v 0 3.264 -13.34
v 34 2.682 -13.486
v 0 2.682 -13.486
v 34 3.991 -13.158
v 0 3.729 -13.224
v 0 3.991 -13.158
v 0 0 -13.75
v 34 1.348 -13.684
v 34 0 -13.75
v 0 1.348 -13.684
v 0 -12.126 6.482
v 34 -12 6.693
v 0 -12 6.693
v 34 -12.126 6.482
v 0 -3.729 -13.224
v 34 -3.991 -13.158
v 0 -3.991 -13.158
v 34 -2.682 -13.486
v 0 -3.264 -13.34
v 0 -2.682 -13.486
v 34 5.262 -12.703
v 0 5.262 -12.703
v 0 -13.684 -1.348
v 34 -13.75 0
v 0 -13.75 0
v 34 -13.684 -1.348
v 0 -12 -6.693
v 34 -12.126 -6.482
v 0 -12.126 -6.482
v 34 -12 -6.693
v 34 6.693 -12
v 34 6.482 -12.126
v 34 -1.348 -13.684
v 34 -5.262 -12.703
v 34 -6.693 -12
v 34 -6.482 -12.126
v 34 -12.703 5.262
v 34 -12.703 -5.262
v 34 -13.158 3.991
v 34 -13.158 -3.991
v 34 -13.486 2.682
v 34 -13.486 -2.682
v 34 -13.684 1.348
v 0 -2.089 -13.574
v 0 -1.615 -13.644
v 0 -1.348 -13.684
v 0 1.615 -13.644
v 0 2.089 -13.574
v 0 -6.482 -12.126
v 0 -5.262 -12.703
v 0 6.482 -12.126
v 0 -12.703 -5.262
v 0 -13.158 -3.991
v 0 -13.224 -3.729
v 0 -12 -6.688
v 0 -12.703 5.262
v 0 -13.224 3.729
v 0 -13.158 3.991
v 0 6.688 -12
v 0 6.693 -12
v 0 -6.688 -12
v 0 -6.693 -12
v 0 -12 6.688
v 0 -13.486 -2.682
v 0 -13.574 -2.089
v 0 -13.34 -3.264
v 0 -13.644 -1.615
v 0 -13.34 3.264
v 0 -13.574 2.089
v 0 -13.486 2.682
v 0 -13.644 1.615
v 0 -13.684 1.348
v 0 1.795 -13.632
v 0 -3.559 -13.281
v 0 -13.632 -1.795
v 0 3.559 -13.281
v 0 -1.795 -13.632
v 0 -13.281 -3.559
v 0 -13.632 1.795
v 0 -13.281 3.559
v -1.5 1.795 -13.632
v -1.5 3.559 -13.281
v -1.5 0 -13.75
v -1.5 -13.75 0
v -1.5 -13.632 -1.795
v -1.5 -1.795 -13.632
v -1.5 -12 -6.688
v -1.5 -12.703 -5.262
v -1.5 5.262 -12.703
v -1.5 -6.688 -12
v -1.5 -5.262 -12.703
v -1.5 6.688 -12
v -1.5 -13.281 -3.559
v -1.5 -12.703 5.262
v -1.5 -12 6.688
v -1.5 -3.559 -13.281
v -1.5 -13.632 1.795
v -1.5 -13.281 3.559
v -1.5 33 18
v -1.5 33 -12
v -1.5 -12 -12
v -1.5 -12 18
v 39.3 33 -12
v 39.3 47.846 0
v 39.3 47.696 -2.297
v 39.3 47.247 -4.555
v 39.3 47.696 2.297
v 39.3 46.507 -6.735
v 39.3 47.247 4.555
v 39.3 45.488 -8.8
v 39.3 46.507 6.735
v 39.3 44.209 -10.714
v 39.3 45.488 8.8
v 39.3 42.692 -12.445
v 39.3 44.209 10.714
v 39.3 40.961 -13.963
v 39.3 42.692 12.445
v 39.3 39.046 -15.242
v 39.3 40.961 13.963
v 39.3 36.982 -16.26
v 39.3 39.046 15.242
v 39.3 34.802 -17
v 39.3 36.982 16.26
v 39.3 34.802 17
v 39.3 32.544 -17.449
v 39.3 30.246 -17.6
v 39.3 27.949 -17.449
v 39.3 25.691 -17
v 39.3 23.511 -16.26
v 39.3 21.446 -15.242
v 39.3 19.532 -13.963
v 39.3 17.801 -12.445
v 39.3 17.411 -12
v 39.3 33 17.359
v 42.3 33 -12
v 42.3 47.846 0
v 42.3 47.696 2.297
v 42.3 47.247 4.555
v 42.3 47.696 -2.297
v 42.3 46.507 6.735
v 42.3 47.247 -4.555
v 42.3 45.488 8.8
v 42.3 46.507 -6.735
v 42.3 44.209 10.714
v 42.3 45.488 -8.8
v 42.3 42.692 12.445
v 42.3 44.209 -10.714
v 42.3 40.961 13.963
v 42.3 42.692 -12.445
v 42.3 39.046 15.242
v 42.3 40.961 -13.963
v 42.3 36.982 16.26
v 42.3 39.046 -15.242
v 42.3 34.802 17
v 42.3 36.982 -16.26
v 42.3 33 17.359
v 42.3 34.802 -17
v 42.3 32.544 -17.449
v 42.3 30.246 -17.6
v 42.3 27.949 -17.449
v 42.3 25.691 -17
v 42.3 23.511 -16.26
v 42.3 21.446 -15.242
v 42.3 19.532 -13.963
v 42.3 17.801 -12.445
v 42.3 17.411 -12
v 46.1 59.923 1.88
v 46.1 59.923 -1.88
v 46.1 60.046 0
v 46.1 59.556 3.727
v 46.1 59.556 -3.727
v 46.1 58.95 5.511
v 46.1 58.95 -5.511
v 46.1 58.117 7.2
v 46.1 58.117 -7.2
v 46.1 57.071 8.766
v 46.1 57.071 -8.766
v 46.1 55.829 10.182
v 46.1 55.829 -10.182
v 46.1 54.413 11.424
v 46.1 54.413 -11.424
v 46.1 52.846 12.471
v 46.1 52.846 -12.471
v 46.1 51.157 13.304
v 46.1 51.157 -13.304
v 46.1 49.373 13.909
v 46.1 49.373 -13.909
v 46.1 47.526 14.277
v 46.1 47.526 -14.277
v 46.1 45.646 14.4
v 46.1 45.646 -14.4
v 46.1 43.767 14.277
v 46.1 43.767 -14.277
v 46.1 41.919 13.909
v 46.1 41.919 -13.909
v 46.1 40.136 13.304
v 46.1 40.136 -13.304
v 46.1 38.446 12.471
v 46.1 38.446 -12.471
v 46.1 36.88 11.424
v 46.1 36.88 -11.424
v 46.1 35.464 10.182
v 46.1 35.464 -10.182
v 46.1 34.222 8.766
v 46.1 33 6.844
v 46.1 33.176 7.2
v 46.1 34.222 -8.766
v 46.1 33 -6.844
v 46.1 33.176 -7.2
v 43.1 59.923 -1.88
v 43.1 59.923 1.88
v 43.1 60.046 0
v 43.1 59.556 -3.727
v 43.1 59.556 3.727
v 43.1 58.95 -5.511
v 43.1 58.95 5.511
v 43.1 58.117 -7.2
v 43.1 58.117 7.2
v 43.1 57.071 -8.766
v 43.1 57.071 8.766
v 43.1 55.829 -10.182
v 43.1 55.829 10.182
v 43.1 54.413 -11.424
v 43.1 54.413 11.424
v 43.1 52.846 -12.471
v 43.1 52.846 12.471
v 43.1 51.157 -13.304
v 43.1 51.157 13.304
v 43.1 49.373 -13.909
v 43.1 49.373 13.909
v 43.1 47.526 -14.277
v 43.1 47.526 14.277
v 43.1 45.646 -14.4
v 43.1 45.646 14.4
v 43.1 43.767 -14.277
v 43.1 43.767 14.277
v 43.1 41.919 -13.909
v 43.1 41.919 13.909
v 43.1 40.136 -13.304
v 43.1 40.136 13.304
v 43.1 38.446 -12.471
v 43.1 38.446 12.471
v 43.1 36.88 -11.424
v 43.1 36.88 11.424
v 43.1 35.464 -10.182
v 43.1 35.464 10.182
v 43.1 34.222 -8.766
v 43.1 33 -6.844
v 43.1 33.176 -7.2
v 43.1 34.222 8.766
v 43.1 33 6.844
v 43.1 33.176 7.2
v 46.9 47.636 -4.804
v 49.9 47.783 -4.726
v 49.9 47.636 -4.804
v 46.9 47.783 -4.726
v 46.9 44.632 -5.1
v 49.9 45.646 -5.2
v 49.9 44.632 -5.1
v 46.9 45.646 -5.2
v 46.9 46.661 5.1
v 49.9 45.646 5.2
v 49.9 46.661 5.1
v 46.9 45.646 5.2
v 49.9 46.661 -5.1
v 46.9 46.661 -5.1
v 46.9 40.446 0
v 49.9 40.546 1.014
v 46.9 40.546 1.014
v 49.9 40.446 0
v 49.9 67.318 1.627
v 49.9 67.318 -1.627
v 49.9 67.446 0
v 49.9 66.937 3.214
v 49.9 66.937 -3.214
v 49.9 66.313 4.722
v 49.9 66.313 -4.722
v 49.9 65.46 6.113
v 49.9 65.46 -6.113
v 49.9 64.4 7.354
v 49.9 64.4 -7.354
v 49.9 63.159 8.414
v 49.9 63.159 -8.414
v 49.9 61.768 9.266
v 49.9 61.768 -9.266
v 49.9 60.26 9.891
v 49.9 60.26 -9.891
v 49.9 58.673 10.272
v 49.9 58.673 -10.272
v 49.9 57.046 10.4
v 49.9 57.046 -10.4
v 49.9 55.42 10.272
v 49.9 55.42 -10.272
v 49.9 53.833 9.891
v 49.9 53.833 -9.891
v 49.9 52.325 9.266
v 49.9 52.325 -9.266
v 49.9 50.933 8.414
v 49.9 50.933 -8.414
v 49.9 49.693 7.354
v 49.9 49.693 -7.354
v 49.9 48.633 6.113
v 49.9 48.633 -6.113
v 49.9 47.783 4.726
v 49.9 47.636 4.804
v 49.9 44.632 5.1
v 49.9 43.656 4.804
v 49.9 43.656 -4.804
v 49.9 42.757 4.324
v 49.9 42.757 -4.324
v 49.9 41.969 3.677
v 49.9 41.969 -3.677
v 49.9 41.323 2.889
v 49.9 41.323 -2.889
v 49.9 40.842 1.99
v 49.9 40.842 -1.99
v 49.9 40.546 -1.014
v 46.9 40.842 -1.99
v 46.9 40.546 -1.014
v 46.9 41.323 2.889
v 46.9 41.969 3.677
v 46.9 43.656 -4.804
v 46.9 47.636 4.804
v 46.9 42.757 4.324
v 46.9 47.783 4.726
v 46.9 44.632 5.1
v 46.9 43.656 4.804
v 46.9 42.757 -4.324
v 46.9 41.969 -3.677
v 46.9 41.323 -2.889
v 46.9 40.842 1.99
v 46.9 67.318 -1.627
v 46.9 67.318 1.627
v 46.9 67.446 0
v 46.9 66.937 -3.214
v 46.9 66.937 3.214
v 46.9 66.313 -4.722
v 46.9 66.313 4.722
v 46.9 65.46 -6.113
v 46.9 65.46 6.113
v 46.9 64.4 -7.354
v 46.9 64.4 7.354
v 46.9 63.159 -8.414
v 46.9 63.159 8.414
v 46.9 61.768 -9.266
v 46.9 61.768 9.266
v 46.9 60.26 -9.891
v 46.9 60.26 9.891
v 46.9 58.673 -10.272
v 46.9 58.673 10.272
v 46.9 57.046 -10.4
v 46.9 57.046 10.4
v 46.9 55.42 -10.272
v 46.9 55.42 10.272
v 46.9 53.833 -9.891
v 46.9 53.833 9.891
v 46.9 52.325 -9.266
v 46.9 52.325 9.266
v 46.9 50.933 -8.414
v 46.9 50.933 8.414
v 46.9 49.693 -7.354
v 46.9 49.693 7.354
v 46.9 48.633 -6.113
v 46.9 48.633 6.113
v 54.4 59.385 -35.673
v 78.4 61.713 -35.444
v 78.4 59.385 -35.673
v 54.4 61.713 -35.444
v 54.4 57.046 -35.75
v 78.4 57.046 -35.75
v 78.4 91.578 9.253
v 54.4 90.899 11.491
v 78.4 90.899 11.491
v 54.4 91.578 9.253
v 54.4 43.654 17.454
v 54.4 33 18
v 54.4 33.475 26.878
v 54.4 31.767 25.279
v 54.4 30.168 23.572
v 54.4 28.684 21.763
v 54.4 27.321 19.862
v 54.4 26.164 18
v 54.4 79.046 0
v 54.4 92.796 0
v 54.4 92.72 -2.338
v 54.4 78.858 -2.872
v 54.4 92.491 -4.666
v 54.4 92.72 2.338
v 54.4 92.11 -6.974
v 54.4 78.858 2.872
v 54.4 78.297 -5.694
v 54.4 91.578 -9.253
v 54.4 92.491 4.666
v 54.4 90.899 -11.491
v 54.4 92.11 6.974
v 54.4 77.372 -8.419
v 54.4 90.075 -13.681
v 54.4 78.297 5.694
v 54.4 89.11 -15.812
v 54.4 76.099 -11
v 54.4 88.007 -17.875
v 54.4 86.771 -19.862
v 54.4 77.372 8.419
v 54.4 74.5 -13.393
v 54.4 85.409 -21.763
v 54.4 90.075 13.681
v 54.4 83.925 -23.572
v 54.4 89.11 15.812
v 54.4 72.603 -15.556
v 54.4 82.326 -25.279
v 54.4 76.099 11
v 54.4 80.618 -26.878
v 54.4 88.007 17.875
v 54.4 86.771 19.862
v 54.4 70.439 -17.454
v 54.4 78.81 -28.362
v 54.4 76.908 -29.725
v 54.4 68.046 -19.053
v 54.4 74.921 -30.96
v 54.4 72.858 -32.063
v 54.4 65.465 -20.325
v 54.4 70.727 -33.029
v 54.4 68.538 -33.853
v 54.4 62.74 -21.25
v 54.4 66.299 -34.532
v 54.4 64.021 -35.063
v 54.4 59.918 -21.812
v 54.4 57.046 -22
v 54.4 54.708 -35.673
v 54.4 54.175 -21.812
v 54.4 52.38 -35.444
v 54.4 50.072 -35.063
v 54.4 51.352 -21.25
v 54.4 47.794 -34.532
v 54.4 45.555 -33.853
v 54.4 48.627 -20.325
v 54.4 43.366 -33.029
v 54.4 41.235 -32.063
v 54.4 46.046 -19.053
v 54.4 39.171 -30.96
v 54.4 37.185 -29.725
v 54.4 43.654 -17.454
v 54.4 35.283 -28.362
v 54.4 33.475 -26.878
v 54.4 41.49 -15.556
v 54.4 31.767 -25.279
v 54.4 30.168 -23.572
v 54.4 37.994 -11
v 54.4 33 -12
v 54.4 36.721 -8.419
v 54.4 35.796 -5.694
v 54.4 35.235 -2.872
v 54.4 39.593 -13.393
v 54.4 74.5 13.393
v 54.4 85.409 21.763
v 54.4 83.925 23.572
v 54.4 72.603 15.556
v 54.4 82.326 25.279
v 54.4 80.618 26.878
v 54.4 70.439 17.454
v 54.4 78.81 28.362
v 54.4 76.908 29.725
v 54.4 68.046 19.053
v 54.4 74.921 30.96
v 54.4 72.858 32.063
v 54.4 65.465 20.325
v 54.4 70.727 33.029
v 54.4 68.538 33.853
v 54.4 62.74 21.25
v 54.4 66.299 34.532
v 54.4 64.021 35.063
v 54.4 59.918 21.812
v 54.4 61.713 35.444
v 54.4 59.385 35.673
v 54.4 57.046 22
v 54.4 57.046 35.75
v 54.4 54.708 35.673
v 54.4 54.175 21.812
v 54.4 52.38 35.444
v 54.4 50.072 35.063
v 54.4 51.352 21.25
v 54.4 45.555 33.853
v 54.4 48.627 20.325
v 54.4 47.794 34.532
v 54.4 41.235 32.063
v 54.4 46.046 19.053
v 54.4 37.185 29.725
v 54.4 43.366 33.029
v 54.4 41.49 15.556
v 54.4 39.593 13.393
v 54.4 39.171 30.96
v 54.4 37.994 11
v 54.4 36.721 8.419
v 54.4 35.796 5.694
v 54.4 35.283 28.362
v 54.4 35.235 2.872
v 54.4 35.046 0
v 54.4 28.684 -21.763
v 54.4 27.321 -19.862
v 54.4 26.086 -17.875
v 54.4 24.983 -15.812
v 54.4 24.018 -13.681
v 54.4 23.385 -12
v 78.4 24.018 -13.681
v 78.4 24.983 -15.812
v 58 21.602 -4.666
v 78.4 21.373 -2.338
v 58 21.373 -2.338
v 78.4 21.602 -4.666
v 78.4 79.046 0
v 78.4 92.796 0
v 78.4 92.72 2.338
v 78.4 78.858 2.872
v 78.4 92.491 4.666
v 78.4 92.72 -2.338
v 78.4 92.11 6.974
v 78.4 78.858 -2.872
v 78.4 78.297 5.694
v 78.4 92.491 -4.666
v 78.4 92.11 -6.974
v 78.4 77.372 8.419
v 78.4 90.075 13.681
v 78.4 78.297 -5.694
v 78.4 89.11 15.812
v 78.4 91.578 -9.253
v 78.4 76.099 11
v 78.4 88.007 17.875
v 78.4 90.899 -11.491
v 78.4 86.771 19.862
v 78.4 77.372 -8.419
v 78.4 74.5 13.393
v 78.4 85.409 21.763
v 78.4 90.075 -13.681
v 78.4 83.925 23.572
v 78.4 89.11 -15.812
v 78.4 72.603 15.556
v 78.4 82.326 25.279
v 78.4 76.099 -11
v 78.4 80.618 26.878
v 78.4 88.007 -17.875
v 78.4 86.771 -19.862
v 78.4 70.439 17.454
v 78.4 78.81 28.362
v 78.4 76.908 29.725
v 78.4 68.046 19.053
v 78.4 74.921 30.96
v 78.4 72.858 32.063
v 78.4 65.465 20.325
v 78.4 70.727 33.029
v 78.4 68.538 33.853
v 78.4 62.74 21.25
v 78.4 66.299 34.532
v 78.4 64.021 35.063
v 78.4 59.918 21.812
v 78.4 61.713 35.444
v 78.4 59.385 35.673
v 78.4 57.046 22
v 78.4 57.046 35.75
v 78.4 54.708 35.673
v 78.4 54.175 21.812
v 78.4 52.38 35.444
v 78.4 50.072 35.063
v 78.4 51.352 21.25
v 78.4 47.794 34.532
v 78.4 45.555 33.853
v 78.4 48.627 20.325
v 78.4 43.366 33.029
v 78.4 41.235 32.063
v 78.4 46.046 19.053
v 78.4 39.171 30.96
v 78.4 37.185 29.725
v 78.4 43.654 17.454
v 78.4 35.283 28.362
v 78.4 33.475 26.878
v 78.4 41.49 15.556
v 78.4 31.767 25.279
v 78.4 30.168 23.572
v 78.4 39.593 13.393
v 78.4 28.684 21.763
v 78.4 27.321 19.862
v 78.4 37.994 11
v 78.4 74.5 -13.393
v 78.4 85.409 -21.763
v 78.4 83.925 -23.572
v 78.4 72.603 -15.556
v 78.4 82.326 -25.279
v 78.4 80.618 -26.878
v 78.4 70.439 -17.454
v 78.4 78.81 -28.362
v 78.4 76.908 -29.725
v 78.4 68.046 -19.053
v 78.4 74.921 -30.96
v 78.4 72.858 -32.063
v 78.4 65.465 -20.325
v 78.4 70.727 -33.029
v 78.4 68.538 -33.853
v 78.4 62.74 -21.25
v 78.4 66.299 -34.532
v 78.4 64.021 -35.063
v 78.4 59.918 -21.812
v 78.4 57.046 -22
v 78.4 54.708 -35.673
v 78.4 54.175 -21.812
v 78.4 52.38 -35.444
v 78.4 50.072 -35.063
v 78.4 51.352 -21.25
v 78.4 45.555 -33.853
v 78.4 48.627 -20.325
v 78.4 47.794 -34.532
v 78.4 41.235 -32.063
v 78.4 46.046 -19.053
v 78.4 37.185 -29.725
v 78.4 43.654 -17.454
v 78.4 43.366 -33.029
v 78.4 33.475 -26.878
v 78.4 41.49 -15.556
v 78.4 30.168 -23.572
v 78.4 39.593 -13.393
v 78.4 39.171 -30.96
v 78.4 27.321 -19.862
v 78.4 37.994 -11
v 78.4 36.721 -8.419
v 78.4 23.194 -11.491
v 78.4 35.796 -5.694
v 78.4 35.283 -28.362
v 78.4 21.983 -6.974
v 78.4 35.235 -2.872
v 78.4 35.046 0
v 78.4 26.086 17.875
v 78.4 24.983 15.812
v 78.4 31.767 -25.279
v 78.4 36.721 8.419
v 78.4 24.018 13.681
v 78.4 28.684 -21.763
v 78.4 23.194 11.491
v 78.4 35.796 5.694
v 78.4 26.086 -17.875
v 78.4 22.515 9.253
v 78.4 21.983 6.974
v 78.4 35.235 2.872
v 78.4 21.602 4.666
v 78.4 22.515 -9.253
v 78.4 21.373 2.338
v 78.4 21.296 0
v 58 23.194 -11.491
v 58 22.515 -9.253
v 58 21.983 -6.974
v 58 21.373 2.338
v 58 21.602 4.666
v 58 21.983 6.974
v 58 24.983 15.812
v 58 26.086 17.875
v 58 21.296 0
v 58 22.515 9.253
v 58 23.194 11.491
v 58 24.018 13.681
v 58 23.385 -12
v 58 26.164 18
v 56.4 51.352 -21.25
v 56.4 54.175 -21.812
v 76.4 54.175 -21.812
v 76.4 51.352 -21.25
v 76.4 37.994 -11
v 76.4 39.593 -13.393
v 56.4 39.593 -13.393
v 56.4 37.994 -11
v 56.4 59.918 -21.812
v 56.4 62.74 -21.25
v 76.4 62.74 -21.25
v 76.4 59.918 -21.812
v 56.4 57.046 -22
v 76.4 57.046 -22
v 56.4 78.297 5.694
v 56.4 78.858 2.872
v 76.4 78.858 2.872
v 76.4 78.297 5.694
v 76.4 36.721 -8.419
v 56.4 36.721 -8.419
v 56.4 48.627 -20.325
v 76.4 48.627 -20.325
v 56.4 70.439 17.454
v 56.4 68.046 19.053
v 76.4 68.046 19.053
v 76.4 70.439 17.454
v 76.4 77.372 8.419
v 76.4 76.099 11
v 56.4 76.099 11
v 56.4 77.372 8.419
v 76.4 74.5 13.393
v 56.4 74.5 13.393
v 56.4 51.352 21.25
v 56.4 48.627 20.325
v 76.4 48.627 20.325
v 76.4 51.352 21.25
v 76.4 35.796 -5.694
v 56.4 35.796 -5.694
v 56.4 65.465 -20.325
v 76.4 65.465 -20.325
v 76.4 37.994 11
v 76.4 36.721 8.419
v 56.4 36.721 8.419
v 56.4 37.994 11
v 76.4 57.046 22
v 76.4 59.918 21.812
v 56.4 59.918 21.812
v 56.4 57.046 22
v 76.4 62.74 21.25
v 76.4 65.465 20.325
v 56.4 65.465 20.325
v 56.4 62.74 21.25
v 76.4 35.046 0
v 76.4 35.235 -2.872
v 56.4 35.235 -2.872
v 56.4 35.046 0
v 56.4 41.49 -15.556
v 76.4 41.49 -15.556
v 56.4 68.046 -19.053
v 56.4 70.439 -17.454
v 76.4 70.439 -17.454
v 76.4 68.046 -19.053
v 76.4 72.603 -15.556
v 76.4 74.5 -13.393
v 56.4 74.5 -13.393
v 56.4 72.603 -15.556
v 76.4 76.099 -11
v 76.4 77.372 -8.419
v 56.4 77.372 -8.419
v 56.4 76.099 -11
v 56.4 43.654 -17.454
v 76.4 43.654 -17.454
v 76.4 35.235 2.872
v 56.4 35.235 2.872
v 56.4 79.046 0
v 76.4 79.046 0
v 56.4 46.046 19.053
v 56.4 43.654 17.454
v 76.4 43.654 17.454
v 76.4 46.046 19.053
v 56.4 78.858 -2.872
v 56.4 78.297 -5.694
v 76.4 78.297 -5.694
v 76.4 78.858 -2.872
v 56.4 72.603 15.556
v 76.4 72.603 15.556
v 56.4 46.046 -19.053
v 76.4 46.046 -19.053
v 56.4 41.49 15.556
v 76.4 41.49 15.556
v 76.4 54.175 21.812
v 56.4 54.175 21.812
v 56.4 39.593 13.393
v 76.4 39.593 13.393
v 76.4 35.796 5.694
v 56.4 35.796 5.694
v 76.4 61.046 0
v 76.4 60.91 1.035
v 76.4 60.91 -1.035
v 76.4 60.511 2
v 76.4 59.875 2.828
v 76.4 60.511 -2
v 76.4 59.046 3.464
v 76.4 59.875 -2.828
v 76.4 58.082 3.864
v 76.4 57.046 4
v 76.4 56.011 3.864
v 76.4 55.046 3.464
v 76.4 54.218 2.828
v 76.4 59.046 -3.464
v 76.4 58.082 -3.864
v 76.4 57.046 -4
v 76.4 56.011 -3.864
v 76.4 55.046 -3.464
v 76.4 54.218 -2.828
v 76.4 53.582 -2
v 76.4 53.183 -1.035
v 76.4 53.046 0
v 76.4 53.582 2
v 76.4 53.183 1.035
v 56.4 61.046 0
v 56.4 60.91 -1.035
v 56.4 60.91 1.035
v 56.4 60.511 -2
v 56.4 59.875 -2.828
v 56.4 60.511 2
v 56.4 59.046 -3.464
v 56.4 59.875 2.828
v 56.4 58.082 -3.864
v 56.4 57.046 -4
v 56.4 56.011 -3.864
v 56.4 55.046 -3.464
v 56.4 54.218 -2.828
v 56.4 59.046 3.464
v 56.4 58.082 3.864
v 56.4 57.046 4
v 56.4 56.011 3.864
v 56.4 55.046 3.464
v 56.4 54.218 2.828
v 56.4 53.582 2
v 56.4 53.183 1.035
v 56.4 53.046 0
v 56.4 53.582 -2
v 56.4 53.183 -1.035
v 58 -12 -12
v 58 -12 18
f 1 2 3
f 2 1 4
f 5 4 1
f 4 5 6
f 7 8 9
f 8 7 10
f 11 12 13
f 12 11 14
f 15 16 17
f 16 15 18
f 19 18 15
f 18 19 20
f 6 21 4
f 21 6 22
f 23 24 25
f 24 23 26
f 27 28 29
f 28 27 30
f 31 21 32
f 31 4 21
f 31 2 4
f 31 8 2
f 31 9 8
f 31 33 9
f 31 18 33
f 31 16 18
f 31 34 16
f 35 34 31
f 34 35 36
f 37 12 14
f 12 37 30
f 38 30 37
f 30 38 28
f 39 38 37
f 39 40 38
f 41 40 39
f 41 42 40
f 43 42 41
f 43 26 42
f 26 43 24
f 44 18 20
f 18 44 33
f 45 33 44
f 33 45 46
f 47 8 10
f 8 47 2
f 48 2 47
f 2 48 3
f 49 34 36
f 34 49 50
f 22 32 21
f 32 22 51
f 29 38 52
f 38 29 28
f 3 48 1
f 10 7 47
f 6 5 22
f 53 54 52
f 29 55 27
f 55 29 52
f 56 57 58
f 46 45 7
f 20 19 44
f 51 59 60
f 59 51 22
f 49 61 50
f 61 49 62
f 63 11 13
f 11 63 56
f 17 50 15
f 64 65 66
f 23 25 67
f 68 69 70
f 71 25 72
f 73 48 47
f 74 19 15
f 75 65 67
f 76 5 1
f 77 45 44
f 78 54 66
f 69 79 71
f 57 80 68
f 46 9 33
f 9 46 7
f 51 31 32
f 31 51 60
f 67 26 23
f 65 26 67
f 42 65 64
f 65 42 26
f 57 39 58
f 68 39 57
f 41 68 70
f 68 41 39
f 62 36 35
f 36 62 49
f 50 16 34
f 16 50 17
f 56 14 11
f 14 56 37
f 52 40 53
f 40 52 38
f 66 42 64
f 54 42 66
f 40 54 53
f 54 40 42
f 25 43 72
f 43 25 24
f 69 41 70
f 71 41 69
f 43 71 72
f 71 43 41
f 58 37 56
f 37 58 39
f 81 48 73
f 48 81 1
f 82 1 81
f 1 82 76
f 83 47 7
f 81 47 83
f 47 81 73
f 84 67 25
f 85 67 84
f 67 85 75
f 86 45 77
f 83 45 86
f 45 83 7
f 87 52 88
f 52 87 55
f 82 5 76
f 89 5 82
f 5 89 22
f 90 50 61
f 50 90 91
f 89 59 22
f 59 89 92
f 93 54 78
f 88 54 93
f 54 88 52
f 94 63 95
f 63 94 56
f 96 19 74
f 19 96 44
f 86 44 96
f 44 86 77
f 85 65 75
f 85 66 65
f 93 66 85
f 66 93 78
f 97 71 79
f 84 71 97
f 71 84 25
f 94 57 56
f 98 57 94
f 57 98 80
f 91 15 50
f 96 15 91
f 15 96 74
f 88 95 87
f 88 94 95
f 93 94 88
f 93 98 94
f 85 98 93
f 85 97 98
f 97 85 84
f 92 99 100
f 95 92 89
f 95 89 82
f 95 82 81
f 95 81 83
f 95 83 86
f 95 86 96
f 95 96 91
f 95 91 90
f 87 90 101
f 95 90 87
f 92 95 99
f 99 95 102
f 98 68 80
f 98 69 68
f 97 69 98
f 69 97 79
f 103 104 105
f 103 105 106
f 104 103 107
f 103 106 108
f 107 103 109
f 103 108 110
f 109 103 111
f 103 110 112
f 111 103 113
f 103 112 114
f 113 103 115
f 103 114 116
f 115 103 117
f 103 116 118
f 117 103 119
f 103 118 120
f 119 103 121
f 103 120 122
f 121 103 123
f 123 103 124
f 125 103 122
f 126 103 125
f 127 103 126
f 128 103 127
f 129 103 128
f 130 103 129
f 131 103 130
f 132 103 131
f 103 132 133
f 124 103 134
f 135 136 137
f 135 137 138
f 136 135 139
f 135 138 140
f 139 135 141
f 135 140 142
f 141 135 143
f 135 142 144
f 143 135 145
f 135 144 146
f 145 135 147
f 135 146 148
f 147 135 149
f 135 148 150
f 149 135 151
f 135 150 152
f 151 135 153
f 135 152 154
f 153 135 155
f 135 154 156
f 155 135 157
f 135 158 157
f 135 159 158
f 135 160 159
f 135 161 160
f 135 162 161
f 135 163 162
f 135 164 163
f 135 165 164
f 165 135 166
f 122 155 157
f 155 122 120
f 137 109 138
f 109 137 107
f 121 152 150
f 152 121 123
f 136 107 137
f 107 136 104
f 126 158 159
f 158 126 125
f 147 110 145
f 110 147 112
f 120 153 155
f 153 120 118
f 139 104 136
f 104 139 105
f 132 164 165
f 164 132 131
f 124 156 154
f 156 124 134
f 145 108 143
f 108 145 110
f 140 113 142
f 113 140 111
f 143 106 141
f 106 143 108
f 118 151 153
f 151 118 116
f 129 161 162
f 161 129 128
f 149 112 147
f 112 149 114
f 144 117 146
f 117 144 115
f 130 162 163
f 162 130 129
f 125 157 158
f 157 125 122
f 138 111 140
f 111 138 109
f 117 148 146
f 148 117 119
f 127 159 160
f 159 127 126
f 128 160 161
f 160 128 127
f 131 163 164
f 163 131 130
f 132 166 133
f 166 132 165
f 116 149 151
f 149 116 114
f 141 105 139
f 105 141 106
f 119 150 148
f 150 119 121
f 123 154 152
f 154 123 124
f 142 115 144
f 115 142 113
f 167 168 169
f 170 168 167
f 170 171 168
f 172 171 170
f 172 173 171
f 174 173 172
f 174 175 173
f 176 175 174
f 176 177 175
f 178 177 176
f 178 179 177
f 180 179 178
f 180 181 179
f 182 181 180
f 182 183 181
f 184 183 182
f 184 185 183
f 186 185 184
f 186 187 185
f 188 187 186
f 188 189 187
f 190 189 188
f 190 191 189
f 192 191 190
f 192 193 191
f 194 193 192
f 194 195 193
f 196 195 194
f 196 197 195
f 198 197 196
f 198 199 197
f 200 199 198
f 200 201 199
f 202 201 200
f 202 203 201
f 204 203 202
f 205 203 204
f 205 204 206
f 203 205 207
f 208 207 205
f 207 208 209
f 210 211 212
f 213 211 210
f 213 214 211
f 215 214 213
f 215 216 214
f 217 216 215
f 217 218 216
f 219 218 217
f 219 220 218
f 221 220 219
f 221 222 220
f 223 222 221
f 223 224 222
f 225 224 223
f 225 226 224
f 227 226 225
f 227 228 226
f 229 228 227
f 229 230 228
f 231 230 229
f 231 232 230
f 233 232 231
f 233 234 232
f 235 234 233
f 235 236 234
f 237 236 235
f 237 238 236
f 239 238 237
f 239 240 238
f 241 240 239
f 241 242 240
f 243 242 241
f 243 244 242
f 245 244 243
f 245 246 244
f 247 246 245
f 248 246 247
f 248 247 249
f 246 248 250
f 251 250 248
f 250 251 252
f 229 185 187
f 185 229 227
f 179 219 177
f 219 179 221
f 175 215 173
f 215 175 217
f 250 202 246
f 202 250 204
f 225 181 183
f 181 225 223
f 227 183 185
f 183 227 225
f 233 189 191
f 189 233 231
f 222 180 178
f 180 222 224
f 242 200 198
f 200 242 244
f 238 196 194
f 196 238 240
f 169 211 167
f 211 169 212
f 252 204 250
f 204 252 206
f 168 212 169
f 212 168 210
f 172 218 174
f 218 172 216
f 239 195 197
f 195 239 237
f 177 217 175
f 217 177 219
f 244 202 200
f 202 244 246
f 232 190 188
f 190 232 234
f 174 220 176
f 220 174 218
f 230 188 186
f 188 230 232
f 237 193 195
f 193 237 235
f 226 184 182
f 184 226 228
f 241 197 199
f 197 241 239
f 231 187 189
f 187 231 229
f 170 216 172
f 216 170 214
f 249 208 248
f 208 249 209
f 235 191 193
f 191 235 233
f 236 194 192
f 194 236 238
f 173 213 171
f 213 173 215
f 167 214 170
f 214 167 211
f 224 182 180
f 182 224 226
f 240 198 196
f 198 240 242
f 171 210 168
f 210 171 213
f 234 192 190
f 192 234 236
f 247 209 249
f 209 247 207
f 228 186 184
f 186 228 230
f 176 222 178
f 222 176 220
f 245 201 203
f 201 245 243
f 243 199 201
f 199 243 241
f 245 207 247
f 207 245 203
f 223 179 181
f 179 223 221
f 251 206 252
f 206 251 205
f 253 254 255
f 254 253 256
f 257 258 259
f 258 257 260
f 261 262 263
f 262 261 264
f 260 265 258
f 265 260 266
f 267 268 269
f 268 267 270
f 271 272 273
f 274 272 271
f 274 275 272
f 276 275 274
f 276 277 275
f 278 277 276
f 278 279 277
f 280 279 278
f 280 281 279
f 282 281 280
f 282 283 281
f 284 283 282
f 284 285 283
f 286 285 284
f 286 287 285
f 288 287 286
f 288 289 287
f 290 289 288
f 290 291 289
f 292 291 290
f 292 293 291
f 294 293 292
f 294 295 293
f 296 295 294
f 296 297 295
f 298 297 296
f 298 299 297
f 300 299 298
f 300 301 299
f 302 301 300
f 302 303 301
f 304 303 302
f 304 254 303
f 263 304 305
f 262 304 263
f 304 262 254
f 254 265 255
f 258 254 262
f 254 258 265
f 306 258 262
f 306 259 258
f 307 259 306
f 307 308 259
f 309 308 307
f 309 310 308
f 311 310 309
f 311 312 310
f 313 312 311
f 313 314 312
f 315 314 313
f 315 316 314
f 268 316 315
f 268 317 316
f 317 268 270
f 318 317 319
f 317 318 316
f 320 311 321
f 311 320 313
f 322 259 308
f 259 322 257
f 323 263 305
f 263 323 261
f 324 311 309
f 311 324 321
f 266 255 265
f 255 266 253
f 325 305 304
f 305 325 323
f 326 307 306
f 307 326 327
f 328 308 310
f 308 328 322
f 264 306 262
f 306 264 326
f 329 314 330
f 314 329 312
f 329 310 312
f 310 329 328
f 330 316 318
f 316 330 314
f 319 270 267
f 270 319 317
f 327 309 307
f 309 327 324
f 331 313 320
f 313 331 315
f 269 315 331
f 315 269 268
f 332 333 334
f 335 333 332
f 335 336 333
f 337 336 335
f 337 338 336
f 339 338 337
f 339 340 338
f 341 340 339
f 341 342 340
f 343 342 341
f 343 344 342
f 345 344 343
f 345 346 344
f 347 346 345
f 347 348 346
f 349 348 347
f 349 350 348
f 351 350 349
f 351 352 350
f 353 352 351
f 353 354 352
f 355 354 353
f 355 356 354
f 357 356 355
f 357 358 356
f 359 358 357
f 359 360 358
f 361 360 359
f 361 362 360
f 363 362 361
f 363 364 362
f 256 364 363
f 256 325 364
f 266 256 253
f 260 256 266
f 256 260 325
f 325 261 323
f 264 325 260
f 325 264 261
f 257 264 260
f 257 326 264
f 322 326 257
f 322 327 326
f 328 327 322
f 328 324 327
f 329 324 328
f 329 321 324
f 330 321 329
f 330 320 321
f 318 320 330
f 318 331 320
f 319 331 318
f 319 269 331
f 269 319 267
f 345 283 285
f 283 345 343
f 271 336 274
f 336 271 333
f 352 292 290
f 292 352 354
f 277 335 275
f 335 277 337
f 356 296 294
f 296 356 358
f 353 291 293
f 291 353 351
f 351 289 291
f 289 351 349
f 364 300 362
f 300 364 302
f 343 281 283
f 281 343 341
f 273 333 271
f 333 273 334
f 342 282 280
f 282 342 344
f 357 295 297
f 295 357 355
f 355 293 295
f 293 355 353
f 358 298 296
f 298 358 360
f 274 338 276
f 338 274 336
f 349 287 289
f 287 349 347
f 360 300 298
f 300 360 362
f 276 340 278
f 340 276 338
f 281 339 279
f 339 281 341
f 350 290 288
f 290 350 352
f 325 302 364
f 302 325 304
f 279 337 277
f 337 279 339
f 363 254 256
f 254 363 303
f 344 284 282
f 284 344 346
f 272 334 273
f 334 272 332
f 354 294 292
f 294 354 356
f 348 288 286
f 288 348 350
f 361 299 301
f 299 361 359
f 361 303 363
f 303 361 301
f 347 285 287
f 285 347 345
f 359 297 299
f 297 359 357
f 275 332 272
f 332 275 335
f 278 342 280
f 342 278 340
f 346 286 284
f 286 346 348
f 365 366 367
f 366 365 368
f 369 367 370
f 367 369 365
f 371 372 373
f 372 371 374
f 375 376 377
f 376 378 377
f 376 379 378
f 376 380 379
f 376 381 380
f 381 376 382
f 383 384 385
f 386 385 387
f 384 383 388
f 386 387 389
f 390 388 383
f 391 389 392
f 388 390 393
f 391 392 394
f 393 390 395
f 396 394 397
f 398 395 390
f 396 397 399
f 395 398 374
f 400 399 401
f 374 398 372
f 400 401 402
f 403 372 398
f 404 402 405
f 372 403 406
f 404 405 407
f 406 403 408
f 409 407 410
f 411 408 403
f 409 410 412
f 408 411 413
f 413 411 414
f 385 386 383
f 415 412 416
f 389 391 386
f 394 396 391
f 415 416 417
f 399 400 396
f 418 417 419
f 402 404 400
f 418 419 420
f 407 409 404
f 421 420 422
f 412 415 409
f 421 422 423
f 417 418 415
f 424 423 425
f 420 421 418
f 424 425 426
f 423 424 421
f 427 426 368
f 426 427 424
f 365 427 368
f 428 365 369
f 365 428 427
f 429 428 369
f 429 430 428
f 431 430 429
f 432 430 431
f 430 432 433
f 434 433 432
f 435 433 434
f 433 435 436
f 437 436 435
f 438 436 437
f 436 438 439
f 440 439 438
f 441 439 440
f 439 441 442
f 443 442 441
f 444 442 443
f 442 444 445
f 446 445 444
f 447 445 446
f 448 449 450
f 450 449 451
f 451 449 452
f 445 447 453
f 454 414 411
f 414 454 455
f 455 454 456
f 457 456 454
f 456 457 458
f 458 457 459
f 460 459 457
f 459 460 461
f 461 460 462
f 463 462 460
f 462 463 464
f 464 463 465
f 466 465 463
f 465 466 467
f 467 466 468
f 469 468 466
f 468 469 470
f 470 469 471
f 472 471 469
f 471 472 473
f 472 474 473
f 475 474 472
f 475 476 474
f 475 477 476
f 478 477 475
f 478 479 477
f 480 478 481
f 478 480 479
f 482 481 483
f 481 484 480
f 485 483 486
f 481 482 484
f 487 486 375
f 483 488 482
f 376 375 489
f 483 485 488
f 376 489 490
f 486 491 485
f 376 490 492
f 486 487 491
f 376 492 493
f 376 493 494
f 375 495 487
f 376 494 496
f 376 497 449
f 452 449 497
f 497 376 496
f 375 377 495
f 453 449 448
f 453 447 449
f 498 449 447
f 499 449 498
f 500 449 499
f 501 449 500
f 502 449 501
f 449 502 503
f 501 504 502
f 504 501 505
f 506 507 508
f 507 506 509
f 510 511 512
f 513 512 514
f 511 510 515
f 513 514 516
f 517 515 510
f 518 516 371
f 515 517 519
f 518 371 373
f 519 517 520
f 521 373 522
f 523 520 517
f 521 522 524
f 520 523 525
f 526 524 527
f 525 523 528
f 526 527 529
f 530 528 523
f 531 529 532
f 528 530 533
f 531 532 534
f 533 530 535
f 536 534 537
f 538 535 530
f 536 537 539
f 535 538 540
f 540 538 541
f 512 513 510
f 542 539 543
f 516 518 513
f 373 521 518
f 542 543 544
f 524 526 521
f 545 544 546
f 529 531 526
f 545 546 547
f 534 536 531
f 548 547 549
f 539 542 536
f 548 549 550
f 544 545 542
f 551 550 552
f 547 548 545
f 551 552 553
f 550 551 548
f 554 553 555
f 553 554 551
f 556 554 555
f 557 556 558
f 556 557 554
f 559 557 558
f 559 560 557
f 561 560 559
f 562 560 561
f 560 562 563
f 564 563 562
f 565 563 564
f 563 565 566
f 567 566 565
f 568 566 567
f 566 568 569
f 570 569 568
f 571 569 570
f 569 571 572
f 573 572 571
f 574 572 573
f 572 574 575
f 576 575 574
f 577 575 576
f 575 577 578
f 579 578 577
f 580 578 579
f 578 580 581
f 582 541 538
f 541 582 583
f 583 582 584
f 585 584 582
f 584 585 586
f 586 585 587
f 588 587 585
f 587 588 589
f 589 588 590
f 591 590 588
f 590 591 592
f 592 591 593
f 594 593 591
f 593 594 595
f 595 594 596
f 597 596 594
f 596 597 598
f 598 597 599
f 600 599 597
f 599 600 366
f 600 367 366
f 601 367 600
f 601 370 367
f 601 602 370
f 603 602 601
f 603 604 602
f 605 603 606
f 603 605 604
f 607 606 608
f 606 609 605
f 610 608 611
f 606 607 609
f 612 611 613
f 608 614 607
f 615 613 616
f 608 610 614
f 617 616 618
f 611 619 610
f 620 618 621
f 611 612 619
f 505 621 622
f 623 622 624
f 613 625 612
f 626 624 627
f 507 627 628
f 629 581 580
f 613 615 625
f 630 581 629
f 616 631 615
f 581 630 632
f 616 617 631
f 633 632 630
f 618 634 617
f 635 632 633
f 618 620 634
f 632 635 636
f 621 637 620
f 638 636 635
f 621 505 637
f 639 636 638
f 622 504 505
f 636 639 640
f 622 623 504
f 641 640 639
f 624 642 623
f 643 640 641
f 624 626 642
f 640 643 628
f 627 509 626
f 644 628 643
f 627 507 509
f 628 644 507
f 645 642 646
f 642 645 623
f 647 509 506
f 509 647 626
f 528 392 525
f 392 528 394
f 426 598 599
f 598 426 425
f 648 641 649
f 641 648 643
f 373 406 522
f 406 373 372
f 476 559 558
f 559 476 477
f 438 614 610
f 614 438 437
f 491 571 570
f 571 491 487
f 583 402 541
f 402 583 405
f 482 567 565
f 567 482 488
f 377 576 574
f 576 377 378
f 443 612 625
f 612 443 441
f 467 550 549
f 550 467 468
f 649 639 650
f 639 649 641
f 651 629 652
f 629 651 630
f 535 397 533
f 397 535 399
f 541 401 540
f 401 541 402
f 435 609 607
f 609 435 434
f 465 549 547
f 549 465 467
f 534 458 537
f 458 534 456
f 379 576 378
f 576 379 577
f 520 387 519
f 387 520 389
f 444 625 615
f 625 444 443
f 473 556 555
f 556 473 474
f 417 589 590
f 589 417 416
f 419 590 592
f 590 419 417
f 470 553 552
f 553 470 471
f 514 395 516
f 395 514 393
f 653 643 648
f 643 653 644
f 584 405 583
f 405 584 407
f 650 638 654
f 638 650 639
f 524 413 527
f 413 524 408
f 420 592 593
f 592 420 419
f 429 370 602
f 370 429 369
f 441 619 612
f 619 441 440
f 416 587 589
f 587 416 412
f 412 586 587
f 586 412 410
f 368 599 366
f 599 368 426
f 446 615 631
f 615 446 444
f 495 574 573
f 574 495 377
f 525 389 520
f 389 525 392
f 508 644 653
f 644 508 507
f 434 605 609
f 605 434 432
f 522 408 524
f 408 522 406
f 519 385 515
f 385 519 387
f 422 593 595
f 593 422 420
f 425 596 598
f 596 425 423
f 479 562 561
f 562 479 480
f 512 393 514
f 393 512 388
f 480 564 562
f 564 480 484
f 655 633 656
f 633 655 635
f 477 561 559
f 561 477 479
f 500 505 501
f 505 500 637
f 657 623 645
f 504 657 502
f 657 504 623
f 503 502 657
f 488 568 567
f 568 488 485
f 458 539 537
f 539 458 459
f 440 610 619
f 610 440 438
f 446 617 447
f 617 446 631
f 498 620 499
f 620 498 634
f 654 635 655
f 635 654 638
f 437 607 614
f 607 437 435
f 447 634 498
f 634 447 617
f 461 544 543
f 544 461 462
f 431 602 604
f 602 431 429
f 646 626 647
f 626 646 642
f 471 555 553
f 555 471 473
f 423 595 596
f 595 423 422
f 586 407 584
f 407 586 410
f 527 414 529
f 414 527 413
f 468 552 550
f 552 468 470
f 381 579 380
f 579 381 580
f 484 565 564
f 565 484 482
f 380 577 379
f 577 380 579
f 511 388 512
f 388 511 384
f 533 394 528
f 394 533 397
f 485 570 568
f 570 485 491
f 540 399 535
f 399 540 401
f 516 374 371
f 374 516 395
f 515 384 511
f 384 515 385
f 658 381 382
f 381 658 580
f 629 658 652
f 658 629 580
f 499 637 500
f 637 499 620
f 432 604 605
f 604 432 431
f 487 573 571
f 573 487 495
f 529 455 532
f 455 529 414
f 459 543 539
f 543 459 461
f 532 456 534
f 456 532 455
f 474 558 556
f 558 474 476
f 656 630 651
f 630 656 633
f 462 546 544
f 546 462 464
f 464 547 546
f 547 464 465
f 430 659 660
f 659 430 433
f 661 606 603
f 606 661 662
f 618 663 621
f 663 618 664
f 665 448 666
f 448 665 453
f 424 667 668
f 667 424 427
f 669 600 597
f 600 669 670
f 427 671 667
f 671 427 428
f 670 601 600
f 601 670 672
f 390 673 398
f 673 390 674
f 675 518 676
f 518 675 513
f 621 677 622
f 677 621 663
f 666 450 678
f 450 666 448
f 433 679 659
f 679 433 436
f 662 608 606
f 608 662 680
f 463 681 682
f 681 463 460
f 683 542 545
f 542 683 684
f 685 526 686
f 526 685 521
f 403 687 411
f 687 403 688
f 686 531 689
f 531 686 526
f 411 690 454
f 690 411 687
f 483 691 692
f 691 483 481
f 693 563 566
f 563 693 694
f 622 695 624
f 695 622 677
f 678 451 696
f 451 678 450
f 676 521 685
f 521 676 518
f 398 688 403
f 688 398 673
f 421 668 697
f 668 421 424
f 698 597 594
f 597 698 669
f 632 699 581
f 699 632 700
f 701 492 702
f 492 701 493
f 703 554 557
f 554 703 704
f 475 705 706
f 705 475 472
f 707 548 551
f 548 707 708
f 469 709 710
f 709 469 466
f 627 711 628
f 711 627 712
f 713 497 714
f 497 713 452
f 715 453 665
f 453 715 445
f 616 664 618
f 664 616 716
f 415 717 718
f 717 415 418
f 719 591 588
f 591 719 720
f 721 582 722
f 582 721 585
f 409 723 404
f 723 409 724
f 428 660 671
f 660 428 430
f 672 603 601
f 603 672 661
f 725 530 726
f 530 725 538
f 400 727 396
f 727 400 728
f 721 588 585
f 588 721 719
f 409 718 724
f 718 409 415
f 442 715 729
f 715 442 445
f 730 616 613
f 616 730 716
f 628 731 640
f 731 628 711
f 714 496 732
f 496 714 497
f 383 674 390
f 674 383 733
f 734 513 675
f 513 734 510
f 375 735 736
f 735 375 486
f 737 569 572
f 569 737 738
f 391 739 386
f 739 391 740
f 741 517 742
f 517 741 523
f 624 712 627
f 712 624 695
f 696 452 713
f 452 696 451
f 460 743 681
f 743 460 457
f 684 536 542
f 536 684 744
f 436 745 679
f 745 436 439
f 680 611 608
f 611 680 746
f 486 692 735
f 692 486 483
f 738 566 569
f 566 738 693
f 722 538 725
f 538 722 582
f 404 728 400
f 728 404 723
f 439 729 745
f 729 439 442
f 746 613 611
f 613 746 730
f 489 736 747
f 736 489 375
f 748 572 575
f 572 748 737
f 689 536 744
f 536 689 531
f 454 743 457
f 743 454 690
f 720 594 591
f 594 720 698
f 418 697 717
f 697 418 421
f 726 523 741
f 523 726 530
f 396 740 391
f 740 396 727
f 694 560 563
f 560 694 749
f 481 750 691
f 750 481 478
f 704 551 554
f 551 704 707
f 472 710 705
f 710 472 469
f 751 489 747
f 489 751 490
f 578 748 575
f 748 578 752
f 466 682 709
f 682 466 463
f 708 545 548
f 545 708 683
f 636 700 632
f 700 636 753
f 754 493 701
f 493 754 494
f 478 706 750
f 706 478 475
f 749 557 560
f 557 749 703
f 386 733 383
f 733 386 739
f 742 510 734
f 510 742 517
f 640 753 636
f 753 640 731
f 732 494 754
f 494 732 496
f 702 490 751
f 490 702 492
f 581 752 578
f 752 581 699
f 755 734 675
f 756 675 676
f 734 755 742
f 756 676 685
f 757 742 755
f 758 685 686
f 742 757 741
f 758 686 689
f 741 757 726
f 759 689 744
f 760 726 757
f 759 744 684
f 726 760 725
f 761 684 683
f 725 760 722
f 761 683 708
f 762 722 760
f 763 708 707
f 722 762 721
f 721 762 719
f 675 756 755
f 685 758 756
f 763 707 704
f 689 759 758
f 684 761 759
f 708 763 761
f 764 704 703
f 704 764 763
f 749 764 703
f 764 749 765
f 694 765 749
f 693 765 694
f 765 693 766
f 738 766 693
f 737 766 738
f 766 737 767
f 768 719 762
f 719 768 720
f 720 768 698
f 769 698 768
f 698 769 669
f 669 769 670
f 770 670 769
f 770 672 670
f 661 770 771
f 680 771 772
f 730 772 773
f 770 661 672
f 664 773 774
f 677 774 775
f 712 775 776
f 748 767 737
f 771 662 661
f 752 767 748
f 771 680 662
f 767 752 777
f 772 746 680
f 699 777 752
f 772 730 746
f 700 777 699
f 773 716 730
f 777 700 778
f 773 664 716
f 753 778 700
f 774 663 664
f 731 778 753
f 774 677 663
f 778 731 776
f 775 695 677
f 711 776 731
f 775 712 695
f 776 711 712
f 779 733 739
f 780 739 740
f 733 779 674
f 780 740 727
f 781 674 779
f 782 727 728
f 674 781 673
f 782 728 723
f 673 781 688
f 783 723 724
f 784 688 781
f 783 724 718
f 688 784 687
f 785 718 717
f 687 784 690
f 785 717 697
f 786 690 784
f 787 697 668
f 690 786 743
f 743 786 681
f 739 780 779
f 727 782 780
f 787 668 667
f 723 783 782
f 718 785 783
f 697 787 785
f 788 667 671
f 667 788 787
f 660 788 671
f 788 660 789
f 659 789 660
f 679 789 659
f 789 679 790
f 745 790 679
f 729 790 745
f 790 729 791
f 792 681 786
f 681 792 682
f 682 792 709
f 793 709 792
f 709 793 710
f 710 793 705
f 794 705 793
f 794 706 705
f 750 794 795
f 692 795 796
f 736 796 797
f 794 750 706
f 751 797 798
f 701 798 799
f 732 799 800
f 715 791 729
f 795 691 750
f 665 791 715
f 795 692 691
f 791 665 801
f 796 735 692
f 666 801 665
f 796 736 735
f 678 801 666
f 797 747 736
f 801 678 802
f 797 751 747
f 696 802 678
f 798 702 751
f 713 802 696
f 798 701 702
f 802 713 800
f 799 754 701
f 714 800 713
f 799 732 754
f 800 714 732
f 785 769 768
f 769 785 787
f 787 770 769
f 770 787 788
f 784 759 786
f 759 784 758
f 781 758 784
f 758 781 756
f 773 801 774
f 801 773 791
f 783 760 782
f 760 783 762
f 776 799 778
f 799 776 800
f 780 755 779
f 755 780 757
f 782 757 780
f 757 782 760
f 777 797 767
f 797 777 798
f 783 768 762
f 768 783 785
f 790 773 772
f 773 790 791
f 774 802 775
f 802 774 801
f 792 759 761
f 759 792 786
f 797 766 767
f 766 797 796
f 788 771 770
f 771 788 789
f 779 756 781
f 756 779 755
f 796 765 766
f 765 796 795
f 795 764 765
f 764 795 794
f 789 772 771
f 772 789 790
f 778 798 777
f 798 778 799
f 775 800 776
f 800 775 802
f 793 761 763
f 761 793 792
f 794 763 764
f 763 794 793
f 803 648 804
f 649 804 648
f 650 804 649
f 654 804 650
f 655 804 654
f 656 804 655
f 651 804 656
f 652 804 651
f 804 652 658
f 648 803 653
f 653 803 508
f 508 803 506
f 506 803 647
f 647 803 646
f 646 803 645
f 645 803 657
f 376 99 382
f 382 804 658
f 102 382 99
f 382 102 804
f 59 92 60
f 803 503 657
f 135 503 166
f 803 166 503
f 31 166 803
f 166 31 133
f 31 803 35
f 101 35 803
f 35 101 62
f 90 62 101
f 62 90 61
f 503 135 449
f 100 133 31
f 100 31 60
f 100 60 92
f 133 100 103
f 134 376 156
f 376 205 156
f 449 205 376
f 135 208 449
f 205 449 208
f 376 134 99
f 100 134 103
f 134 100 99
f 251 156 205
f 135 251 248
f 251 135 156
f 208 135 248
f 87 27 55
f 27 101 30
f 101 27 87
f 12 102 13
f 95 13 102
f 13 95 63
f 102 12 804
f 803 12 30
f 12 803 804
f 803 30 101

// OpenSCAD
// Roborock S5-family drive wheel module — gearbox + wheel, measured rebuild
// ===========================================================================
//
// Parametric CAD of the drive-wheel gear train, motor and wheel, built
// 2026-09-06 from the MERGED physical measurements in
//   contributions/part-specs/IKsares/drive-wheel/README.md   (upstream PR #61)
// Gear math: Kenedy & Son helical relations (module mn, helix angle beta):
//   pitch dia d = mn*z/cos(beta);  tip dia = d + 2*mn;  centre dist a = mn*(z1+z2)/(2*cos(beta)).
//
// Relation to prior art:
//   - SUPERSEDES the earlier all-(estimate) sketch of this module (branch
//     source-3d-models-osakatex-aug24, unmerged): tire, hub, gearbox-block,
//     suspension, bracket and limit-switch geometry there were unverified;
//     this file keeps only the layout idea and carries MEASURED numbers.
//   - Scowt/DriveWheel.md and IKsares agree on the 7-pin connector row
//     (IKsares verified it pin-for-pin); electrical detail lives in their
//     docs — this file is mechanical only.
//
// Number provenance, inline tags:
//   [M]  measured by IKsares (part-specs/IKsares/drive-wheel/README.md)
//   [M1] derived from IKsares data via the Kenedy & Son relations
//   [E]  estimate — verify with calipers before relying on it (MEASURE-ME.md §1)
//
// NOT yet modelled-from-measurement: housing walls, snap features, bearing
// seats, the suspension arm and the gearbox-to-chassis interface. The gear
// cylinders, motor and wheel are the [M]/[M1] content; the shell around them
// is an [E] proximity envelope for chassis layout and clash checks only.
//
// Top-level render target (for `openscad -o out.stl`), override with
//   openscad -D 'render_part="MOTOR"' -o motor.stl drive-wheel.scad
render_part = "ASSEMBLY";   // ASSEMBLY | MOTOR | GEARTRAIN | WHEEL

// ---------------- measured inputs ----------------

// gear teeth, counted by IKsares on the opened gearbox [M]
stage1_driver = 11;   // motor pinion, helical (visible in their photo)
stage1_driven = 36;
stage2_driver = 13;
stage2_driven = 42;
stage3_driver = 12;
stage3_driven = 34;
stage4_driver = 11;
stage4_driven = 24;   // output gear on the wheel shaft
// total reduction = (36*42*34*24)/(11*13*12*11) = 65.36:1 [M]

// first stage: normal module + helix angle, inferred by IKsares from the
// caliper OD 7.00 mm (odd-tooth reading; corrected tip dia 7.14 mm):
//   spur m=0.5 -> 6.50, m=0.6 -> 7.80: no spur fits;
//   helical mn=0.5: beta=25deg -> 7.07, beta=30deg -> 7.35 [M1];
//   7.14 lands between 25 and 30 deg -> mid-hypothesis 27.5 deg [M1]
pinion_mn   = 0.5;
pinion_beta = 27.5;
// encoder check that validates the train: 4 rising edges per motor rev [M]
// x 65.36 = 261.4 edges/wheel rev; wheel 224.6 mm -> 0.859 mm/edge [M]

// later stages: module NOT yet established [E] — set from gear sizes once the
// first-stage centre distance confirms whether the train is all-helical
mn_later = 0.8;              // [E] placeholder module for stages 2..4
later_beta    = 0;               // [E] spur assumed until measured
face_w        = 3.0;             // [E] gear face width
stage_gap     = 0.8;             // [E] axial gap between stages

// motor CDM GM-RS360-16248, caliper-measured by IKsares [M]
motor_can_d      = 27.5;   // across the cylinder, clear of the seam
motor_len        = 34.0;   // rear Hall-PCB face to front face, shaft excluded
shaft_protrusion = 10.3;   // front face to shaft tip
shaft_d          = 2.20;
rear_proud       = 1.5;    // [E] ring carrier + solder tabs stand proud of the PCB;
                           //      IKsares: true rear envelope exceeds 44.3 mm (§1/§9)
motor_envelope   = 44.3;   // [M] = 34.0 + 10.3, measured TO THE PCB

// wheel [M unless noted]
wheel_od   = 71.5;   // caliper
wheel_circ = 224.6;  // pi * 71.5, per IKsares
wheel_w    = 24;     // [E] measure together with the OD (MEASURE-ME §1 row 3)
hub_d      = 44;     // [E] rigid hub under the rubber
wheel_bore = 8;      // [E] wheel-side input; UNRELATED to the motor shaft dia

// harness: 7 conductors, 1.5 mm pitch (9.0 mm / 6) -> JST ZH family [M]
// 220 mm total, 155 mm free past the moulded guide [M] — harness ref for
// routing studies; the connector itself is modelled in jigs/, not here.

// ---------------- derived geometry (Kenedy & Son relations) ----------------

function pd(z, mn, b)  = mn * z / cos(b);          // pitch diameter
function tipd(z, mn,b) = pd(z, mn, b) + 2 * mn;    // outside (tip) diameter
function cd(z1, z2, mn, b) = (pd(z1, mn, b) + pd(z2, mn, b)) / 2;

// stage 1, helical [M1]: distances the bench caliper check confirms (MEASURE-ME §1 row 11)
s1_pin_pd  = pd(stage1_driver, pinion_mn, pinion_beta);   // 6.20 mm
s1_gear_pd = pd(stage1_driven, pinion_mn, pinion_beta);   // 20.29 mm
s1_cd      = cd(stage1_driver, stage1_driven, pinion_mn, pinion_beta); // 13.24 mm
s1_gear_tip = tipd(stage1_driven, pinion_mn, pinion_beta);             // 21.29 mm

// stages 2..4, spur placeholder [E]
s2_pin_tip = tipd(stage2_driver, mn_later, later_beta);
s2_gear_tip= tipd(stage2_driven, mn_later, later_beta);
s3_pin_tip = tipd(stage3_driver, mn_later, later_beta);
s3_gear_tip= tipd(stage3_driven, mn_later, later_beta);
s4_pin_tip = tipd(stage4_driver, mn_later, later_beta);
s4_gear_tip= tipd(stage4_driven, mn_later, later_beta);

// shaft-to-shaft centre distances of the placeholder train [E]
s2_cd = (s2_pin_tip + s2_gear_tip)/2 - 2*mn_later;
s3_cd = (s3_pin_tip + s3_gear_tip)/2 - 2*mn_later;
s4_cd = (s4_pin_tip + s4_gear_tip)/2 - 2*mn_later;

clearance = 1.0;   // [E] gear tip to wall
wall      = 1.6;   // [E]

// ---------------- parts ----------------

// motor: can + shaft + rear cap sized to the measured envelope
module motor() {
    color("Goldenrod")
    union() {
        rotate([0, 90, 0]) cylinder(d = motor_can_d, h = motor_len, $fn = 64);
        color("Silver")
            translate([motor_len, 0, 0]) rotate([0, 90, 0])
            cylinder(d = shaft_d, h = shaft_protrusion, $fn = 24);
        color("DarkGreen")                       // rear Hall-PCB cap
            translate([-rear_proud, 0, 0]) rotate([0, 90, 0])
            cylinder(d = motor_can_d, h = rear_proud, $fn = 48);
    }
}

// stage axis offsets, shared by geartrain() and assembly() [E layout derivation]
s_y1 = s1_gear_tip/2 + clearance;
s_y2 = s_y1 + s2_gear_tip/2 + clearance;
s_y3 = s_y2 + s3_gear_tip/2 + clearance;
s_y4 = s_y3 + s4_gear_tip/2 + clearance;
s_x1 = motor_len + face_w/2;
s_x2 = s_x1 + face_w + stage_gap;
s_x3 = s_x2 + face_w + stage_gap;
s_x4 = s_x3 + face_w + stage_gap;

// gear cylinder skeleton: pitch-volume cylinders on their real axes [M1]/[E]
module geartrain() {
    color("Teal") union() {
        // stage 1: motor pinion + 36T gear (helical pair, skew axes by beta)
        translate([motor_len - 3, 0, 0]) scale([1, 1, 1]) rotate([0, -90 + 0, 0])
            cylinder(h = 6, d1 = s1_pin_pd, d2 = s1_pin_pd, $fn = 40);
        translate([s_x1, s_y1, 0]) rotate([0, 90, 0])
            cylinder(h = face_w, d = s1_gear_tip, $fn = 48);
        // stages 2..4, coax pinion+gear pairs (spur placeholder)
        translate([s_x2, s_y1, 0]) rotate([0, 90, 0]) cylinder(h = face_w, d = s2_pin_tip,  $fn = 32);
        translate([s_x2, s_y2, 0]) rotate([0, 90, 0]) cylinder(h = face_w, d = s2_gear_tip, $fn = 48);
        translate([s_x3, s_y2, 0]) rotate([0, 90, 0]) cylinder(h = face_w, d = s3_pin_tip,  $fn = 32);
        translate([s_x3, s_y3, 0]) rotate([0, 90, 0]) cylinder(h = face_w, d = s3_gear_tip, $fn = 48);
        translate([s_x4, s_y3, 0]) rotate([0, 90, 0]) cylinder(h = face_w, d = s4_pin_tip,  $fn = 32);
        translate([s_x4, s_y4, 0]) rotate([0, 90, 0]) cylinder(h = face_w, d = s4_gear_tip, $fn = 40);
    }
}
// wheel: rubber ring + hub + bore on the output shaft [M od / E rest]
module wheel() {
    xr = s4_cd;   // wheel axis = output shaft, offset per the placeholder train [E]
    color("DarkGray")
    union() {
        difference() {
            cylinder(d = wheel_od, h = wheel_w, center = true, $fn = 96);   // tire
            cylinder(d = hub_d,    h = wheel_w + 1, center = true, $fn = 48);
        }
        difference() {
            cylinder(d = hub_d, h = wheel_w - 4, center = true, $fn = 48);  // hub
            cylinder(d = wheel_bore, h = wheel_w - 2, center = true, $fn = 24);
        }
    }
}
// (placed by assembly(); kept unpositioned here to stay single-purpose)

// ---------------- assembly ----------------

module assembly() {
    motor();     // rear cap plane at x=0, shaft pointing +X toward the wheel
    geartrain();
    // wheel on the output shaft, co-axial with stage 4 [E stub length]
    translate([wheel_x + wheel_w/2, s_y4, 0]) rotate([0, 90, 0]) wheel();
    echo(str("ASSEMBLY wheel centre: x=", wheel_x + wheel_w/2, " y=", s_y4));
}

// wheel output-shaft stub beyond the stage-4 gear [E — caliper the real length]
wheel_x = s_x4 + face_w/2 + 6;

// ---------------- shell keeps/routes (all [E]) ----------------

module shell_stub() {
    // NOT the real housing: proximity envelope only — wall clearance over the
    // gear + motor extremes, for chassis layout and clash checks.
    x_len = 34 + 19.5;      // [M motor + E stage stack ~ (12.3+19.1)/... simplified
    y_span = 45;            // [E]
    z_span = 30;            // [E]
    color("Gray", 0.15)
        translate([-rear_proud, -12, -12])
        cube([x_len + 6, y_span, z_span]);
}

module jst_zh7_stub() {
    // 7-pin 1.5 mm-pitch receptacle of the measured harness, connector-side
    // reference only (the printable go/no-go gauge lives in jigs/).
    color("Silver")
    for (i = [0:6])
        translate([0, i * 1.5, 0]) cylinder(d = 0.6, h = 4, $fn = 12);
}

// ---------------- top-level render switch ----------------

module render() {
    if (render_part == "ASSEMBLY") {
        assembly();
        shell_stub();
    } else if (render_part == "MOTOR") {
        motor();
    } else if (render_part == "GEARTRAIN") {
        geartrain();
    } else if (render_part == "WHEEL") {
        wheel();
    } else {
        echo("render_part must be ASSEMBLY|MOTOR|GEARTRAIN|WHEEL");
    }
}

render();
